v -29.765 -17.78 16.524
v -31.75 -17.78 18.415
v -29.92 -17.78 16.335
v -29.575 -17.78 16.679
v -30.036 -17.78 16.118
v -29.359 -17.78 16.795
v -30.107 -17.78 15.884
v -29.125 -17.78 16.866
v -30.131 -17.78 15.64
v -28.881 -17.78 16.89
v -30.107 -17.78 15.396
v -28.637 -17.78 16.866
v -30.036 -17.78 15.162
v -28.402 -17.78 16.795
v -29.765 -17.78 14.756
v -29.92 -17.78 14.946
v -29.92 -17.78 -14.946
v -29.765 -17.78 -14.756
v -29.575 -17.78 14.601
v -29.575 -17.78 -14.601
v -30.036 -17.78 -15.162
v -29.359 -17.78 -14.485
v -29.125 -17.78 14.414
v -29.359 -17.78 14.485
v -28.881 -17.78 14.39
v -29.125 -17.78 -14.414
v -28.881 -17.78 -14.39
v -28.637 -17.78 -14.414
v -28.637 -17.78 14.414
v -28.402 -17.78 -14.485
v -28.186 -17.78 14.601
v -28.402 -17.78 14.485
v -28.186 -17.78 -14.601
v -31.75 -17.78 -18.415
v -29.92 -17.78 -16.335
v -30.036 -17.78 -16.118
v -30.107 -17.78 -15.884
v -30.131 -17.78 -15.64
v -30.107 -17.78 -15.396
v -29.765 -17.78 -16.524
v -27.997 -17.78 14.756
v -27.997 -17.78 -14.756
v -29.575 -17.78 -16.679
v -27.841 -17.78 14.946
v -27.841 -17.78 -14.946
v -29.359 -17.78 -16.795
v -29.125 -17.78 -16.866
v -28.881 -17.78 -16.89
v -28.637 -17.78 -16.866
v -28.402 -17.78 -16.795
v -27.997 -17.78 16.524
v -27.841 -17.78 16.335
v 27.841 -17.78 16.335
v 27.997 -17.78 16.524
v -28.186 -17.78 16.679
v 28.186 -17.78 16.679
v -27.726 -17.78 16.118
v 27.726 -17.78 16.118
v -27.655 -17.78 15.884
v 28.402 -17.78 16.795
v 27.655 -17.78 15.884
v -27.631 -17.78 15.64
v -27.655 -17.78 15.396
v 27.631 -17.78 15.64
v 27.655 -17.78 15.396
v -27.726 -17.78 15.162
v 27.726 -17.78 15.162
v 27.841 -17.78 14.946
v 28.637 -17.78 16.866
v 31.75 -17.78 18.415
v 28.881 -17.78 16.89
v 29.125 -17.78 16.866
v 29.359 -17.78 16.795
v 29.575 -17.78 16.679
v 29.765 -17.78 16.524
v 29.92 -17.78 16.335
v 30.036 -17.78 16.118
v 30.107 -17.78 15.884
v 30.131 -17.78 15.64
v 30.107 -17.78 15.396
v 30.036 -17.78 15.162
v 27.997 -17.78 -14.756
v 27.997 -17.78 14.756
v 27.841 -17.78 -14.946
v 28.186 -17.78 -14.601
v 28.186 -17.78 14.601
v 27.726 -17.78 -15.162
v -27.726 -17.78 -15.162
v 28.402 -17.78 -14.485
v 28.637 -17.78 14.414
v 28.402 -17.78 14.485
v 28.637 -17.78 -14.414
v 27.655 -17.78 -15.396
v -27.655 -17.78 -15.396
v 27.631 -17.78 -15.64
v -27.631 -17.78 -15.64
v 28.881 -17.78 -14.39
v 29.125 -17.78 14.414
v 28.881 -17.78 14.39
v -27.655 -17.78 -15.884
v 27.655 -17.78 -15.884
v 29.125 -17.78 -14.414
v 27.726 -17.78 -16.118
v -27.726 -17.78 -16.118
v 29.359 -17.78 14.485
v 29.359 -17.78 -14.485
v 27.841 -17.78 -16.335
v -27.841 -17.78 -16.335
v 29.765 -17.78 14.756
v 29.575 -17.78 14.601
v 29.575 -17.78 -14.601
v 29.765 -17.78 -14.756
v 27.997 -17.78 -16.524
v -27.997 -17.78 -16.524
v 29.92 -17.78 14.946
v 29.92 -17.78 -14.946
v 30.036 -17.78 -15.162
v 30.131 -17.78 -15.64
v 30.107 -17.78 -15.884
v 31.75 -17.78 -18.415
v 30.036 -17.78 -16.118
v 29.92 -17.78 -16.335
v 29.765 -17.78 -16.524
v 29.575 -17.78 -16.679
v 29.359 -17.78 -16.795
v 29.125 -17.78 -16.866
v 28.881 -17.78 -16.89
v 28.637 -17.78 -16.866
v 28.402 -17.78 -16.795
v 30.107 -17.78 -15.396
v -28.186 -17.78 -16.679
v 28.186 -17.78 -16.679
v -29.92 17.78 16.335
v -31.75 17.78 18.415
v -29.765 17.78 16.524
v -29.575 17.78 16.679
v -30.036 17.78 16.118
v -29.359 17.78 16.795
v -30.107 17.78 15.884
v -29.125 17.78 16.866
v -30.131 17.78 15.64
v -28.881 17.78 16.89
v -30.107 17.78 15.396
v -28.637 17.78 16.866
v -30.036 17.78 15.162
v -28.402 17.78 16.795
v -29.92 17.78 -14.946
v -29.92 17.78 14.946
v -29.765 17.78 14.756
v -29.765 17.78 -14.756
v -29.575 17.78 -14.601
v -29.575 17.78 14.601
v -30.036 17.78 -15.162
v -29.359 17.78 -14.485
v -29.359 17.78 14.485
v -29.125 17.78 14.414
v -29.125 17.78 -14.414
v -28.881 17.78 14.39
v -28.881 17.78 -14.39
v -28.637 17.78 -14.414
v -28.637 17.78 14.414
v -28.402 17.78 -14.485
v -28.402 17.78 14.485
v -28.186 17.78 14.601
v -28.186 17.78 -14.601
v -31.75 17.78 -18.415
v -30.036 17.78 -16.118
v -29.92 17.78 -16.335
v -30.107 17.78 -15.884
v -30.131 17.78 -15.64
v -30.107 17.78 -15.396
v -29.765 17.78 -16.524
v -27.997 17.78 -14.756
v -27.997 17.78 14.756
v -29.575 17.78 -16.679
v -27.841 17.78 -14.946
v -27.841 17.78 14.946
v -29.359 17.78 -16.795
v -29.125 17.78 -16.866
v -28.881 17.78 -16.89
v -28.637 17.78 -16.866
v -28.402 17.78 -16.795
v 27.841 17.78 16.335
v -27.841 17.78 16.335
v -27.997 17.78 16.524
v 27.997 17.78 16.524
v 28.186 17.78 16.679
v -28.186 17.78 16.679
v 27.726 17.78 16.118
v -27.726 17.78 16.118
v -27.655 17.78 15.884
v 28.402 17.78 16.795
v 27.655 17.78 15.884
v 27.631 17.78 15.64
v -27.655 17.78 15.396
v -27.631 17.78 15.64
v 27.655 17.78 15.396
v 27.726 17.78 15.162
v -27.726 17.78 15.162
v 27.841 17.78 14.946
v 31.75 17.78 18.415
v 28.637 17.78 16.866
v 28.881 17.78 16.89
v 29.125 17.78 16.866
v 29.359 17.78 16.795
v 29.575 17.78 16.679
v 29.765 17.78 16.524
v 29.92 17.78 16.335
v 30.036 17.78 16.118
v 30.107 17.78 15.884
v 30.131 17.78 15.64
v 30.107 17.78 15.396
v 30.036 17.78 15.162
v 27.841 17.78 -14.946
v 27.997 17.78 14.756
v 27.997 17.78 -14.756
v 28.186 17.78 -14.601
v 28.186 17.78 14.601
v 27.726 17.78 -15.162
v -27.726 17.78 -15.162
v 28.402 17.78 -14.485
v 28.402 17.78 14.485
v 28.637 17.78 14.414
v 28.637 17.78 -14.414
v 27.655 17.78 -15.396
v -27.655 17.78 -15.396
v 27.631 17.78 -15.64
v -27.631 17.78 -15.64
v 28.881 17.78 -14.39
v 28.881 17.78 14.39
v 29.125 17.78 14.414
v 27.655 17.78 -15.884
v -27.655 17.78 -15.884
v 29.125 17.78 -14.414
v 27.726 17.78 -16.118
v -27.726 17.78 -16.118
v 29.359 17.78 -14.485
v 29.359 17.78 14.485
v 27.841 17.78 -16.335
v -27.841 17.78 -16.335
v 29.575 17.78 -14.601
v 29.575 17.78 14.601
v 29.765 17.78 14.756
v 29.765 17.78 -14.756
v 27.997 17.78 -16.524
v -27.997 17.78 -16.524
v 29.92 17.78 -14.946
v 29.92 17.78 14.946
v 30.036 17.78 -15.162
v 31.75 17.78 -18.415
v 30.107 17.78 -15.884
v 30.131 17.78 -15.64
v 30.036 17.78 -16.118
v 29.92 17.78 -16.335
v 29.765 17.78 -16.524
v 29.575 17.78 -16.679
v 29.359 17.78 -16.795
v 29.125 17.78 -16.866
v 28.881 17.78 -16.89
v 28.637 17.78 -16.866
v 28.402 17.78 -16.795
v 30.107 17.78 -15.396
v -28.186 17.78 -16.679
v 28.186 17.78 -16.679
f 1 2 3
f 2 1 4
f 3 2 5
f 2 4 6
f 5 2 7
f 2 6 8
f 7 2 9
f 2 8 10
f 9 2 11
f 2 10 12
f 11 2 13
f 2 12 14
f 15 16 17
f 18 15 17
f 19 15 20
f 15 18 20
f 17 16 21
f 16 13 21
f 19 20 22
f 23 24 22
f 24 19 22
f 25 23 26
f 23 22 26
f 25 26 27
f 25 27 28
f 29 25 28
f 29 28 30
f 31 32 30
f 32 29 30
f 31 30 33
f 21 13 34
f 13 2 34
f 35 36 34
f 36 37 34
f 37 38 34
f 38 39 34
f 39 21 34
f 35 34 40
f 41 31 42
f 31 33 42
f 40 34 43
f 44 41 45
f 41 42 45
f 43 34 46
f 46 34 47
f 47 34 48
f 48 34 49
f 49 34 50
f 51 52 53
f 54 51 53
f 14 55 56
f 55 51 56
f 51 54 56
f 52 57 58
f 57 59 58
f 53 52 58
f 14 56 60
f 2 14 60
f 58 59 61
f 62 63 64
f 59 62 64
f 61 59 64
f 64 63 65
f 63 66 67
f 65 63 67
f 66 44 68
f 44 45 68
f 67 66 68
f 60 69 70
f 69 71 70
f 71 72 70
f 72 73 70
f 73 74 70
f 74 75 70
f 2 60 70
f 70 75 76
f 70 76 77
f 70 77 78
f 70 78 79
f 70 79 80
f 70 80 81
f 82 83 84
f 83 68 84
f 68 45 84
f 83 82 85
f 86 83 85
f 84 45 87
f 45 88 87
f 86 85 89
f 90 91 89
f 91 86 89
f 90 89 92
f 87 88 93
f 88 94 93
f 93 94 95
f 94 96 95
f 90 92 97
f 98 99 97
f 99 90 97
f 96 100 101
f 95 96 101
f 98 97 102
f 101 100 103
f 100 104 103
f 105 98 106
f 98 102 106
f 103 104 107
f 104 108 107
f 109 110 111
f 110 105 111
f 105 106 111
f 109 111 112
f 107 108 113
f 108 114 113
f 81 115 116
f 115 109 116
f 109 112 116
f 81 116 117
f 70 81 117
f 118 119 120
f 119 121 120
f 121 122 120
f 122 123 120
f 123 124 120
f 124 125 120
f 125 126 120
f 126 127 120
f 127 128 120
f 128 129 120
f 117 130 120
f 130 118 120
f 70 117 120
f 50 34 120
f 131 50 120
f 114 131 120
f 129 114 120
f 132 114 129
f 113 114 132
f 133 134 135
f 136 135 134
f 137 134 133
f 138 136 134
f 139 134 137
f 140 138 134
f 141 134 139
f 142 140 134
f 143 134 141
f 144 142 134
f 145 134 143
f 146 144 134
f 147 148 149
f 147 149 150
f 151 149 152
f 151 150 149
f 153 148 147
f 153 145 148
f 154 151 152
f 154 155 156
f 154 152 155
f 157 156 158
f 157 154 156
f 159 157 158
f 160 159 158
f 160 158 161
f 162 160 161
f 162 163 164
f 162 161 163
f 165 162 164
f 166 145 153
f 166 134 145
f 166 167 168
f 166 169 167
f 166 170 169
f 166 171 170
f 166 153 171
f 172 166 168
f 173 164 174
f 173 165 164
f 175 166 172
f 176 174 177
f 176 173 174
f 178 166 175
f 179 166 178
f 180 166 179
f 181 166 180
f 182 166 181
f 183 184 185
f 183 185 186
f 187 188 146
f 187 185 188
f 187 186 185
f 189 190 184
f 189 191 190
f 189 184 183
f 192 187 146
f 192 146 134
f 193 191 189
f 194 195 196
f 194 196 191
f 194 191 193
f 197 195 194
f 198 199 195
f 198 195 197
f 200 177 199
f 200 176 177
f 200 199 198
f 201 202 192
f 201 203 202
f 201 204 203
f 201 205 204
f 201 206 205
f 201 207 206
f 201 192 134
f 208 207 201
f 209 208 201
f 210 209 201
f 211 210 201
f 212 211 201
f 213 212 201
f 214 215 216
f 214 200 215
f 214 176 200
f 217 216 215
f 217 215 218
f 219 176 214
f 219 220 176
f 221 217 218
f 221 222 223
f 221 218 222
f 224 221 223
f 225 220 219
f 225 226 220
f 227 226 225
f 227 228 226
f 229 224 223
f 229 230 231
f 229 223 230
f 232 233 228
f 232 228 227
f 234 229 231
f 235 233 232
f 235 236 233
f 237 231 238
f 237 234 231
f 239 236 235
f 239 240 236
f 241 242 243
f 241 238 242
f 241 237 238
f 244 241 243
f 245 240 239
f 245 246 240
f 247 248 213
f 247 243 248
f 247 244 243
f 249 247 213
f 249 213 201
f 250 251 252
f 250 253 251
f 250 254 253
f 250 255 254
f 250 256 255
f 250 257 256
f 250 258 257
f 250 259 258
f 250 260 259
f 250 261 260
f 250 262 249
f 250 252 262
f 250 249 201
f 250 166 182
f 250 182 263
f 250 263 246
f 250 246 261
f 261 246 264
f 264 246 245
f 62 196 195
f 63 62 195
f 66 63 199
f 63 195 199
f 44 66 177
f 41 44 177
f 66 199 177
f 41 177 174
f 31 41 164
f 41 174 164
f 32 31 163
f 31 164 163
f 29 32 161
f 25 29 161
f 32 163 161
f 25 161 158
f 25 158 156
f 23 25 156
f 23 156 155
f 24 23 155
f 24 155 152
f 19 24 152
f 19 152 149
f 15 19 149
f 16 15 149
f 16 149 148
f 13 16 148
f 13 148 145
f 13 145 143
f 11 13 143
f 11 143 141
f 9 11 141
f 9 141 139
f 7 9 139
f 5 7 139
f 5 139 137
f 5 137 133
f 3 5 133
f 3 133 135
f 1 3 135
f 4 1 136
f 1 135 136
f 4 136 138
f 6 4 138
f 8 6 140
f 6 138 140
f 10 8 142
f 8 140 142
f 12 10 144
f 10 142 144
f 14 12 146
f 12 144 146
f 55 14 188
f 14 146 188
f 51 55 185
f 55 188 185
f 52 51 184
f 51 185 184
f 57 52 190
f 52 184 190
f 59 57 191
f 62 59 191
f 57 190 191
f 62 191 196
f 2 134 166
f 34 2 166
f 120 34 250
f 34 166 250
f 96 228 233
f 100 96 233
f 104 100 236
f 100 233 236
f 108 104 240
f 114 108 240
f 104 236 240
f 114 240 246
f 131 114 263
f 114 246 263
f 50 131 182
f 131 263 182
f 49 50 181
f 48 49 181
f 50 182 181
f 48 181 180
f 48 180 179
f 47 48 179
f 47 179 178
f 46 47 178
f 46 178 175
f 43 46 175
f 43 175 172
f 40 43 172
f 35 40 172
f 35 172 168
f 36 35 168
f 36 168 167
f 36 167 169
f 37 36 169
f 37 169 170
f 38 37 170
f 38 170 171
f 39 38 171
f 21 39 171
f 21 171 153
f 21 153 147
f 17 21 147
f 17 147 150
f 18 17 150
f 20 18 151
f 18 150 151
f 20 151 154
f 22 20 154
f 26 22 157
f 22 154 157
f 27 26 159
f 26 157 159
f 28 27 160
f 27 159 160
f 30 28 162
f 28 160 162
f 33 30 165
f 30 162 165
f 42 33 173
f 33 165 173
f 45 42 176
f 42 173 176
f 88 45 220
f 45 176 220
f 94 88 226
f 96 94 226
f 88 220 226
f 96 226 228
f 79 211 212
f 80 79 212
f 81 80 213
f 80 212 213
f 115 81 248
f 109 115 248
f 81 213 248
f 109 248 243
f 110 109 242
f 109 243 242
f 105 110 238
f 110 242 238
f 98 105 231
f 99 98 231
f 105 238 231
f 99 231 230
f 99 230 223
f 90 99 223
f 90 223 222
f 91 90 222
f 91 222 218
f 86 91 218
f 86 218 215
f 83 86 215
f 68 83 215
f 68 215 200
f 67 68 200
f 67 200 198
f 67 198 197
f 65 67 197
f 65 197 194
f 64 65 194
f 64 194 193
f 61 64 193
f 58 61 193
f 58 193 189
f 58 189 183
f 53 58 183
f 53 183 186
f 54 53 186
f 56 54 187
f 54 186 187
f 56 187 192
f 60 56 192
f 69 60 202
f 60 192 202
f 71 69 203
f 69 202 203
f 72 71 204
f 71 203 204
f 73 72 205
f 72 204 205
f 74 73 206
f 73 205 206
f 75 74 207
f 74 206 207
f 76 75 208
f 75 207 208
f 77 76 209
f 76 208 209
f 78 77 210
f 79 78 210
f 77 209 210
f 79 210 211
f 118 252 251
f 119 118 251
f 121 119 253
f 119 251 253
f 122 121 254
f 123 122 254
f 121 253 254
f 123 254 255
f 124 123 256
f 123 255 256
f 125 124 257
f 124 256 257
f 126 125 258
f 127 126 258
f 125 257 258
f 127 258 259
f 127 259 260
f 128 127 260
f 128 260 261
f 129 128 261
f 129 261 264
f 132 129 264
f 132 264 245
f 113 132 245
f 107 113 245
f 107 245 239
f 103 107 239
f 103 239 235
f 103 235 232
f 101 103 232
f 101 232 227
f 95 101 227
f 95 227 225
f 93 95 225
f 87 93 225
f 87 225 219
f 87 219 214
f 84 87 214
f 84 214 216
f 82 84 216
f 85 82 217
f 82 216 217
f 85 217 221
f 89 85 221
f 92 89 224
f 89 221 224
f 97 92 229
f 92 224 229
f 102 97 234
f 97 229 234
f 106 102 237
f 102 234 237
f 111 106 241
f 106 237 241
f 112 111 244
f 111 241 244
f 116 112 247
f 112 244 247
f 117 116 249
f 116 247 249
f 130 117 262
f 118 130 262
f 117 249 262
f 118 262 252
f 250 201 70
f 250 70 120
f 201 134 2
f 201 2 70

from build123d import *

# Parameters (mm, degrees)
SKETCH2_W               = 63.5
SKETCH2_H               = 36.83
BOSS_EXTRUDE1_DEPTH     = 17.78
SKETCH3_R               = 1.25
CUT_EXTRUDE1_DEPTH      = 1
CUT_EXTRUDE1_DEPTH_BACK = 36.56


with BuildPart() as part:
    # Sketch2 → Boss-Extrude1 (new body, symmetric)
    with BuildSketch(Plane(origin=(0, 0, 0), x_dir=(1, 0, 0), z_dir=(0, 1, 0))):
        Rectangle(SKETCH2_W, SKETCH2_H)
    extrude(amount=BOSS_EXTRUDE1_DEPTH, both=True)

    # Sketch3 → Cut-Extrude1 (cut, two sides)
    with BuildSketch(Plane(origin=(0, 17.78, 0), x_dir=(1, 0, 0), z_dir=(0, 1, 0))) as cut_extrude1_sk:
        with Locations((-28.88075, 15.64005)):
            Circle(SKETCH3_R)
        with Locations((28.88075, 15.64005)):
            Circle(SKETCH3_R)
        with Locations((28.88075, -15.64005)):
            Circle(SKETCH3_R)
        with Locations((-28.88075, -15.64005)):
            Circle(SKETCH3_R)
    extrude(amount=CUT_EXTRUDE1_DEPTH, mode=Mode.SUBTRACT)
    extrude(cut_extrude1_sk.sketch, amount=-CUT_EXTRUDE1_DEPTH_BACK, mode=Mode.SUBTRACT)


solid = part.part
